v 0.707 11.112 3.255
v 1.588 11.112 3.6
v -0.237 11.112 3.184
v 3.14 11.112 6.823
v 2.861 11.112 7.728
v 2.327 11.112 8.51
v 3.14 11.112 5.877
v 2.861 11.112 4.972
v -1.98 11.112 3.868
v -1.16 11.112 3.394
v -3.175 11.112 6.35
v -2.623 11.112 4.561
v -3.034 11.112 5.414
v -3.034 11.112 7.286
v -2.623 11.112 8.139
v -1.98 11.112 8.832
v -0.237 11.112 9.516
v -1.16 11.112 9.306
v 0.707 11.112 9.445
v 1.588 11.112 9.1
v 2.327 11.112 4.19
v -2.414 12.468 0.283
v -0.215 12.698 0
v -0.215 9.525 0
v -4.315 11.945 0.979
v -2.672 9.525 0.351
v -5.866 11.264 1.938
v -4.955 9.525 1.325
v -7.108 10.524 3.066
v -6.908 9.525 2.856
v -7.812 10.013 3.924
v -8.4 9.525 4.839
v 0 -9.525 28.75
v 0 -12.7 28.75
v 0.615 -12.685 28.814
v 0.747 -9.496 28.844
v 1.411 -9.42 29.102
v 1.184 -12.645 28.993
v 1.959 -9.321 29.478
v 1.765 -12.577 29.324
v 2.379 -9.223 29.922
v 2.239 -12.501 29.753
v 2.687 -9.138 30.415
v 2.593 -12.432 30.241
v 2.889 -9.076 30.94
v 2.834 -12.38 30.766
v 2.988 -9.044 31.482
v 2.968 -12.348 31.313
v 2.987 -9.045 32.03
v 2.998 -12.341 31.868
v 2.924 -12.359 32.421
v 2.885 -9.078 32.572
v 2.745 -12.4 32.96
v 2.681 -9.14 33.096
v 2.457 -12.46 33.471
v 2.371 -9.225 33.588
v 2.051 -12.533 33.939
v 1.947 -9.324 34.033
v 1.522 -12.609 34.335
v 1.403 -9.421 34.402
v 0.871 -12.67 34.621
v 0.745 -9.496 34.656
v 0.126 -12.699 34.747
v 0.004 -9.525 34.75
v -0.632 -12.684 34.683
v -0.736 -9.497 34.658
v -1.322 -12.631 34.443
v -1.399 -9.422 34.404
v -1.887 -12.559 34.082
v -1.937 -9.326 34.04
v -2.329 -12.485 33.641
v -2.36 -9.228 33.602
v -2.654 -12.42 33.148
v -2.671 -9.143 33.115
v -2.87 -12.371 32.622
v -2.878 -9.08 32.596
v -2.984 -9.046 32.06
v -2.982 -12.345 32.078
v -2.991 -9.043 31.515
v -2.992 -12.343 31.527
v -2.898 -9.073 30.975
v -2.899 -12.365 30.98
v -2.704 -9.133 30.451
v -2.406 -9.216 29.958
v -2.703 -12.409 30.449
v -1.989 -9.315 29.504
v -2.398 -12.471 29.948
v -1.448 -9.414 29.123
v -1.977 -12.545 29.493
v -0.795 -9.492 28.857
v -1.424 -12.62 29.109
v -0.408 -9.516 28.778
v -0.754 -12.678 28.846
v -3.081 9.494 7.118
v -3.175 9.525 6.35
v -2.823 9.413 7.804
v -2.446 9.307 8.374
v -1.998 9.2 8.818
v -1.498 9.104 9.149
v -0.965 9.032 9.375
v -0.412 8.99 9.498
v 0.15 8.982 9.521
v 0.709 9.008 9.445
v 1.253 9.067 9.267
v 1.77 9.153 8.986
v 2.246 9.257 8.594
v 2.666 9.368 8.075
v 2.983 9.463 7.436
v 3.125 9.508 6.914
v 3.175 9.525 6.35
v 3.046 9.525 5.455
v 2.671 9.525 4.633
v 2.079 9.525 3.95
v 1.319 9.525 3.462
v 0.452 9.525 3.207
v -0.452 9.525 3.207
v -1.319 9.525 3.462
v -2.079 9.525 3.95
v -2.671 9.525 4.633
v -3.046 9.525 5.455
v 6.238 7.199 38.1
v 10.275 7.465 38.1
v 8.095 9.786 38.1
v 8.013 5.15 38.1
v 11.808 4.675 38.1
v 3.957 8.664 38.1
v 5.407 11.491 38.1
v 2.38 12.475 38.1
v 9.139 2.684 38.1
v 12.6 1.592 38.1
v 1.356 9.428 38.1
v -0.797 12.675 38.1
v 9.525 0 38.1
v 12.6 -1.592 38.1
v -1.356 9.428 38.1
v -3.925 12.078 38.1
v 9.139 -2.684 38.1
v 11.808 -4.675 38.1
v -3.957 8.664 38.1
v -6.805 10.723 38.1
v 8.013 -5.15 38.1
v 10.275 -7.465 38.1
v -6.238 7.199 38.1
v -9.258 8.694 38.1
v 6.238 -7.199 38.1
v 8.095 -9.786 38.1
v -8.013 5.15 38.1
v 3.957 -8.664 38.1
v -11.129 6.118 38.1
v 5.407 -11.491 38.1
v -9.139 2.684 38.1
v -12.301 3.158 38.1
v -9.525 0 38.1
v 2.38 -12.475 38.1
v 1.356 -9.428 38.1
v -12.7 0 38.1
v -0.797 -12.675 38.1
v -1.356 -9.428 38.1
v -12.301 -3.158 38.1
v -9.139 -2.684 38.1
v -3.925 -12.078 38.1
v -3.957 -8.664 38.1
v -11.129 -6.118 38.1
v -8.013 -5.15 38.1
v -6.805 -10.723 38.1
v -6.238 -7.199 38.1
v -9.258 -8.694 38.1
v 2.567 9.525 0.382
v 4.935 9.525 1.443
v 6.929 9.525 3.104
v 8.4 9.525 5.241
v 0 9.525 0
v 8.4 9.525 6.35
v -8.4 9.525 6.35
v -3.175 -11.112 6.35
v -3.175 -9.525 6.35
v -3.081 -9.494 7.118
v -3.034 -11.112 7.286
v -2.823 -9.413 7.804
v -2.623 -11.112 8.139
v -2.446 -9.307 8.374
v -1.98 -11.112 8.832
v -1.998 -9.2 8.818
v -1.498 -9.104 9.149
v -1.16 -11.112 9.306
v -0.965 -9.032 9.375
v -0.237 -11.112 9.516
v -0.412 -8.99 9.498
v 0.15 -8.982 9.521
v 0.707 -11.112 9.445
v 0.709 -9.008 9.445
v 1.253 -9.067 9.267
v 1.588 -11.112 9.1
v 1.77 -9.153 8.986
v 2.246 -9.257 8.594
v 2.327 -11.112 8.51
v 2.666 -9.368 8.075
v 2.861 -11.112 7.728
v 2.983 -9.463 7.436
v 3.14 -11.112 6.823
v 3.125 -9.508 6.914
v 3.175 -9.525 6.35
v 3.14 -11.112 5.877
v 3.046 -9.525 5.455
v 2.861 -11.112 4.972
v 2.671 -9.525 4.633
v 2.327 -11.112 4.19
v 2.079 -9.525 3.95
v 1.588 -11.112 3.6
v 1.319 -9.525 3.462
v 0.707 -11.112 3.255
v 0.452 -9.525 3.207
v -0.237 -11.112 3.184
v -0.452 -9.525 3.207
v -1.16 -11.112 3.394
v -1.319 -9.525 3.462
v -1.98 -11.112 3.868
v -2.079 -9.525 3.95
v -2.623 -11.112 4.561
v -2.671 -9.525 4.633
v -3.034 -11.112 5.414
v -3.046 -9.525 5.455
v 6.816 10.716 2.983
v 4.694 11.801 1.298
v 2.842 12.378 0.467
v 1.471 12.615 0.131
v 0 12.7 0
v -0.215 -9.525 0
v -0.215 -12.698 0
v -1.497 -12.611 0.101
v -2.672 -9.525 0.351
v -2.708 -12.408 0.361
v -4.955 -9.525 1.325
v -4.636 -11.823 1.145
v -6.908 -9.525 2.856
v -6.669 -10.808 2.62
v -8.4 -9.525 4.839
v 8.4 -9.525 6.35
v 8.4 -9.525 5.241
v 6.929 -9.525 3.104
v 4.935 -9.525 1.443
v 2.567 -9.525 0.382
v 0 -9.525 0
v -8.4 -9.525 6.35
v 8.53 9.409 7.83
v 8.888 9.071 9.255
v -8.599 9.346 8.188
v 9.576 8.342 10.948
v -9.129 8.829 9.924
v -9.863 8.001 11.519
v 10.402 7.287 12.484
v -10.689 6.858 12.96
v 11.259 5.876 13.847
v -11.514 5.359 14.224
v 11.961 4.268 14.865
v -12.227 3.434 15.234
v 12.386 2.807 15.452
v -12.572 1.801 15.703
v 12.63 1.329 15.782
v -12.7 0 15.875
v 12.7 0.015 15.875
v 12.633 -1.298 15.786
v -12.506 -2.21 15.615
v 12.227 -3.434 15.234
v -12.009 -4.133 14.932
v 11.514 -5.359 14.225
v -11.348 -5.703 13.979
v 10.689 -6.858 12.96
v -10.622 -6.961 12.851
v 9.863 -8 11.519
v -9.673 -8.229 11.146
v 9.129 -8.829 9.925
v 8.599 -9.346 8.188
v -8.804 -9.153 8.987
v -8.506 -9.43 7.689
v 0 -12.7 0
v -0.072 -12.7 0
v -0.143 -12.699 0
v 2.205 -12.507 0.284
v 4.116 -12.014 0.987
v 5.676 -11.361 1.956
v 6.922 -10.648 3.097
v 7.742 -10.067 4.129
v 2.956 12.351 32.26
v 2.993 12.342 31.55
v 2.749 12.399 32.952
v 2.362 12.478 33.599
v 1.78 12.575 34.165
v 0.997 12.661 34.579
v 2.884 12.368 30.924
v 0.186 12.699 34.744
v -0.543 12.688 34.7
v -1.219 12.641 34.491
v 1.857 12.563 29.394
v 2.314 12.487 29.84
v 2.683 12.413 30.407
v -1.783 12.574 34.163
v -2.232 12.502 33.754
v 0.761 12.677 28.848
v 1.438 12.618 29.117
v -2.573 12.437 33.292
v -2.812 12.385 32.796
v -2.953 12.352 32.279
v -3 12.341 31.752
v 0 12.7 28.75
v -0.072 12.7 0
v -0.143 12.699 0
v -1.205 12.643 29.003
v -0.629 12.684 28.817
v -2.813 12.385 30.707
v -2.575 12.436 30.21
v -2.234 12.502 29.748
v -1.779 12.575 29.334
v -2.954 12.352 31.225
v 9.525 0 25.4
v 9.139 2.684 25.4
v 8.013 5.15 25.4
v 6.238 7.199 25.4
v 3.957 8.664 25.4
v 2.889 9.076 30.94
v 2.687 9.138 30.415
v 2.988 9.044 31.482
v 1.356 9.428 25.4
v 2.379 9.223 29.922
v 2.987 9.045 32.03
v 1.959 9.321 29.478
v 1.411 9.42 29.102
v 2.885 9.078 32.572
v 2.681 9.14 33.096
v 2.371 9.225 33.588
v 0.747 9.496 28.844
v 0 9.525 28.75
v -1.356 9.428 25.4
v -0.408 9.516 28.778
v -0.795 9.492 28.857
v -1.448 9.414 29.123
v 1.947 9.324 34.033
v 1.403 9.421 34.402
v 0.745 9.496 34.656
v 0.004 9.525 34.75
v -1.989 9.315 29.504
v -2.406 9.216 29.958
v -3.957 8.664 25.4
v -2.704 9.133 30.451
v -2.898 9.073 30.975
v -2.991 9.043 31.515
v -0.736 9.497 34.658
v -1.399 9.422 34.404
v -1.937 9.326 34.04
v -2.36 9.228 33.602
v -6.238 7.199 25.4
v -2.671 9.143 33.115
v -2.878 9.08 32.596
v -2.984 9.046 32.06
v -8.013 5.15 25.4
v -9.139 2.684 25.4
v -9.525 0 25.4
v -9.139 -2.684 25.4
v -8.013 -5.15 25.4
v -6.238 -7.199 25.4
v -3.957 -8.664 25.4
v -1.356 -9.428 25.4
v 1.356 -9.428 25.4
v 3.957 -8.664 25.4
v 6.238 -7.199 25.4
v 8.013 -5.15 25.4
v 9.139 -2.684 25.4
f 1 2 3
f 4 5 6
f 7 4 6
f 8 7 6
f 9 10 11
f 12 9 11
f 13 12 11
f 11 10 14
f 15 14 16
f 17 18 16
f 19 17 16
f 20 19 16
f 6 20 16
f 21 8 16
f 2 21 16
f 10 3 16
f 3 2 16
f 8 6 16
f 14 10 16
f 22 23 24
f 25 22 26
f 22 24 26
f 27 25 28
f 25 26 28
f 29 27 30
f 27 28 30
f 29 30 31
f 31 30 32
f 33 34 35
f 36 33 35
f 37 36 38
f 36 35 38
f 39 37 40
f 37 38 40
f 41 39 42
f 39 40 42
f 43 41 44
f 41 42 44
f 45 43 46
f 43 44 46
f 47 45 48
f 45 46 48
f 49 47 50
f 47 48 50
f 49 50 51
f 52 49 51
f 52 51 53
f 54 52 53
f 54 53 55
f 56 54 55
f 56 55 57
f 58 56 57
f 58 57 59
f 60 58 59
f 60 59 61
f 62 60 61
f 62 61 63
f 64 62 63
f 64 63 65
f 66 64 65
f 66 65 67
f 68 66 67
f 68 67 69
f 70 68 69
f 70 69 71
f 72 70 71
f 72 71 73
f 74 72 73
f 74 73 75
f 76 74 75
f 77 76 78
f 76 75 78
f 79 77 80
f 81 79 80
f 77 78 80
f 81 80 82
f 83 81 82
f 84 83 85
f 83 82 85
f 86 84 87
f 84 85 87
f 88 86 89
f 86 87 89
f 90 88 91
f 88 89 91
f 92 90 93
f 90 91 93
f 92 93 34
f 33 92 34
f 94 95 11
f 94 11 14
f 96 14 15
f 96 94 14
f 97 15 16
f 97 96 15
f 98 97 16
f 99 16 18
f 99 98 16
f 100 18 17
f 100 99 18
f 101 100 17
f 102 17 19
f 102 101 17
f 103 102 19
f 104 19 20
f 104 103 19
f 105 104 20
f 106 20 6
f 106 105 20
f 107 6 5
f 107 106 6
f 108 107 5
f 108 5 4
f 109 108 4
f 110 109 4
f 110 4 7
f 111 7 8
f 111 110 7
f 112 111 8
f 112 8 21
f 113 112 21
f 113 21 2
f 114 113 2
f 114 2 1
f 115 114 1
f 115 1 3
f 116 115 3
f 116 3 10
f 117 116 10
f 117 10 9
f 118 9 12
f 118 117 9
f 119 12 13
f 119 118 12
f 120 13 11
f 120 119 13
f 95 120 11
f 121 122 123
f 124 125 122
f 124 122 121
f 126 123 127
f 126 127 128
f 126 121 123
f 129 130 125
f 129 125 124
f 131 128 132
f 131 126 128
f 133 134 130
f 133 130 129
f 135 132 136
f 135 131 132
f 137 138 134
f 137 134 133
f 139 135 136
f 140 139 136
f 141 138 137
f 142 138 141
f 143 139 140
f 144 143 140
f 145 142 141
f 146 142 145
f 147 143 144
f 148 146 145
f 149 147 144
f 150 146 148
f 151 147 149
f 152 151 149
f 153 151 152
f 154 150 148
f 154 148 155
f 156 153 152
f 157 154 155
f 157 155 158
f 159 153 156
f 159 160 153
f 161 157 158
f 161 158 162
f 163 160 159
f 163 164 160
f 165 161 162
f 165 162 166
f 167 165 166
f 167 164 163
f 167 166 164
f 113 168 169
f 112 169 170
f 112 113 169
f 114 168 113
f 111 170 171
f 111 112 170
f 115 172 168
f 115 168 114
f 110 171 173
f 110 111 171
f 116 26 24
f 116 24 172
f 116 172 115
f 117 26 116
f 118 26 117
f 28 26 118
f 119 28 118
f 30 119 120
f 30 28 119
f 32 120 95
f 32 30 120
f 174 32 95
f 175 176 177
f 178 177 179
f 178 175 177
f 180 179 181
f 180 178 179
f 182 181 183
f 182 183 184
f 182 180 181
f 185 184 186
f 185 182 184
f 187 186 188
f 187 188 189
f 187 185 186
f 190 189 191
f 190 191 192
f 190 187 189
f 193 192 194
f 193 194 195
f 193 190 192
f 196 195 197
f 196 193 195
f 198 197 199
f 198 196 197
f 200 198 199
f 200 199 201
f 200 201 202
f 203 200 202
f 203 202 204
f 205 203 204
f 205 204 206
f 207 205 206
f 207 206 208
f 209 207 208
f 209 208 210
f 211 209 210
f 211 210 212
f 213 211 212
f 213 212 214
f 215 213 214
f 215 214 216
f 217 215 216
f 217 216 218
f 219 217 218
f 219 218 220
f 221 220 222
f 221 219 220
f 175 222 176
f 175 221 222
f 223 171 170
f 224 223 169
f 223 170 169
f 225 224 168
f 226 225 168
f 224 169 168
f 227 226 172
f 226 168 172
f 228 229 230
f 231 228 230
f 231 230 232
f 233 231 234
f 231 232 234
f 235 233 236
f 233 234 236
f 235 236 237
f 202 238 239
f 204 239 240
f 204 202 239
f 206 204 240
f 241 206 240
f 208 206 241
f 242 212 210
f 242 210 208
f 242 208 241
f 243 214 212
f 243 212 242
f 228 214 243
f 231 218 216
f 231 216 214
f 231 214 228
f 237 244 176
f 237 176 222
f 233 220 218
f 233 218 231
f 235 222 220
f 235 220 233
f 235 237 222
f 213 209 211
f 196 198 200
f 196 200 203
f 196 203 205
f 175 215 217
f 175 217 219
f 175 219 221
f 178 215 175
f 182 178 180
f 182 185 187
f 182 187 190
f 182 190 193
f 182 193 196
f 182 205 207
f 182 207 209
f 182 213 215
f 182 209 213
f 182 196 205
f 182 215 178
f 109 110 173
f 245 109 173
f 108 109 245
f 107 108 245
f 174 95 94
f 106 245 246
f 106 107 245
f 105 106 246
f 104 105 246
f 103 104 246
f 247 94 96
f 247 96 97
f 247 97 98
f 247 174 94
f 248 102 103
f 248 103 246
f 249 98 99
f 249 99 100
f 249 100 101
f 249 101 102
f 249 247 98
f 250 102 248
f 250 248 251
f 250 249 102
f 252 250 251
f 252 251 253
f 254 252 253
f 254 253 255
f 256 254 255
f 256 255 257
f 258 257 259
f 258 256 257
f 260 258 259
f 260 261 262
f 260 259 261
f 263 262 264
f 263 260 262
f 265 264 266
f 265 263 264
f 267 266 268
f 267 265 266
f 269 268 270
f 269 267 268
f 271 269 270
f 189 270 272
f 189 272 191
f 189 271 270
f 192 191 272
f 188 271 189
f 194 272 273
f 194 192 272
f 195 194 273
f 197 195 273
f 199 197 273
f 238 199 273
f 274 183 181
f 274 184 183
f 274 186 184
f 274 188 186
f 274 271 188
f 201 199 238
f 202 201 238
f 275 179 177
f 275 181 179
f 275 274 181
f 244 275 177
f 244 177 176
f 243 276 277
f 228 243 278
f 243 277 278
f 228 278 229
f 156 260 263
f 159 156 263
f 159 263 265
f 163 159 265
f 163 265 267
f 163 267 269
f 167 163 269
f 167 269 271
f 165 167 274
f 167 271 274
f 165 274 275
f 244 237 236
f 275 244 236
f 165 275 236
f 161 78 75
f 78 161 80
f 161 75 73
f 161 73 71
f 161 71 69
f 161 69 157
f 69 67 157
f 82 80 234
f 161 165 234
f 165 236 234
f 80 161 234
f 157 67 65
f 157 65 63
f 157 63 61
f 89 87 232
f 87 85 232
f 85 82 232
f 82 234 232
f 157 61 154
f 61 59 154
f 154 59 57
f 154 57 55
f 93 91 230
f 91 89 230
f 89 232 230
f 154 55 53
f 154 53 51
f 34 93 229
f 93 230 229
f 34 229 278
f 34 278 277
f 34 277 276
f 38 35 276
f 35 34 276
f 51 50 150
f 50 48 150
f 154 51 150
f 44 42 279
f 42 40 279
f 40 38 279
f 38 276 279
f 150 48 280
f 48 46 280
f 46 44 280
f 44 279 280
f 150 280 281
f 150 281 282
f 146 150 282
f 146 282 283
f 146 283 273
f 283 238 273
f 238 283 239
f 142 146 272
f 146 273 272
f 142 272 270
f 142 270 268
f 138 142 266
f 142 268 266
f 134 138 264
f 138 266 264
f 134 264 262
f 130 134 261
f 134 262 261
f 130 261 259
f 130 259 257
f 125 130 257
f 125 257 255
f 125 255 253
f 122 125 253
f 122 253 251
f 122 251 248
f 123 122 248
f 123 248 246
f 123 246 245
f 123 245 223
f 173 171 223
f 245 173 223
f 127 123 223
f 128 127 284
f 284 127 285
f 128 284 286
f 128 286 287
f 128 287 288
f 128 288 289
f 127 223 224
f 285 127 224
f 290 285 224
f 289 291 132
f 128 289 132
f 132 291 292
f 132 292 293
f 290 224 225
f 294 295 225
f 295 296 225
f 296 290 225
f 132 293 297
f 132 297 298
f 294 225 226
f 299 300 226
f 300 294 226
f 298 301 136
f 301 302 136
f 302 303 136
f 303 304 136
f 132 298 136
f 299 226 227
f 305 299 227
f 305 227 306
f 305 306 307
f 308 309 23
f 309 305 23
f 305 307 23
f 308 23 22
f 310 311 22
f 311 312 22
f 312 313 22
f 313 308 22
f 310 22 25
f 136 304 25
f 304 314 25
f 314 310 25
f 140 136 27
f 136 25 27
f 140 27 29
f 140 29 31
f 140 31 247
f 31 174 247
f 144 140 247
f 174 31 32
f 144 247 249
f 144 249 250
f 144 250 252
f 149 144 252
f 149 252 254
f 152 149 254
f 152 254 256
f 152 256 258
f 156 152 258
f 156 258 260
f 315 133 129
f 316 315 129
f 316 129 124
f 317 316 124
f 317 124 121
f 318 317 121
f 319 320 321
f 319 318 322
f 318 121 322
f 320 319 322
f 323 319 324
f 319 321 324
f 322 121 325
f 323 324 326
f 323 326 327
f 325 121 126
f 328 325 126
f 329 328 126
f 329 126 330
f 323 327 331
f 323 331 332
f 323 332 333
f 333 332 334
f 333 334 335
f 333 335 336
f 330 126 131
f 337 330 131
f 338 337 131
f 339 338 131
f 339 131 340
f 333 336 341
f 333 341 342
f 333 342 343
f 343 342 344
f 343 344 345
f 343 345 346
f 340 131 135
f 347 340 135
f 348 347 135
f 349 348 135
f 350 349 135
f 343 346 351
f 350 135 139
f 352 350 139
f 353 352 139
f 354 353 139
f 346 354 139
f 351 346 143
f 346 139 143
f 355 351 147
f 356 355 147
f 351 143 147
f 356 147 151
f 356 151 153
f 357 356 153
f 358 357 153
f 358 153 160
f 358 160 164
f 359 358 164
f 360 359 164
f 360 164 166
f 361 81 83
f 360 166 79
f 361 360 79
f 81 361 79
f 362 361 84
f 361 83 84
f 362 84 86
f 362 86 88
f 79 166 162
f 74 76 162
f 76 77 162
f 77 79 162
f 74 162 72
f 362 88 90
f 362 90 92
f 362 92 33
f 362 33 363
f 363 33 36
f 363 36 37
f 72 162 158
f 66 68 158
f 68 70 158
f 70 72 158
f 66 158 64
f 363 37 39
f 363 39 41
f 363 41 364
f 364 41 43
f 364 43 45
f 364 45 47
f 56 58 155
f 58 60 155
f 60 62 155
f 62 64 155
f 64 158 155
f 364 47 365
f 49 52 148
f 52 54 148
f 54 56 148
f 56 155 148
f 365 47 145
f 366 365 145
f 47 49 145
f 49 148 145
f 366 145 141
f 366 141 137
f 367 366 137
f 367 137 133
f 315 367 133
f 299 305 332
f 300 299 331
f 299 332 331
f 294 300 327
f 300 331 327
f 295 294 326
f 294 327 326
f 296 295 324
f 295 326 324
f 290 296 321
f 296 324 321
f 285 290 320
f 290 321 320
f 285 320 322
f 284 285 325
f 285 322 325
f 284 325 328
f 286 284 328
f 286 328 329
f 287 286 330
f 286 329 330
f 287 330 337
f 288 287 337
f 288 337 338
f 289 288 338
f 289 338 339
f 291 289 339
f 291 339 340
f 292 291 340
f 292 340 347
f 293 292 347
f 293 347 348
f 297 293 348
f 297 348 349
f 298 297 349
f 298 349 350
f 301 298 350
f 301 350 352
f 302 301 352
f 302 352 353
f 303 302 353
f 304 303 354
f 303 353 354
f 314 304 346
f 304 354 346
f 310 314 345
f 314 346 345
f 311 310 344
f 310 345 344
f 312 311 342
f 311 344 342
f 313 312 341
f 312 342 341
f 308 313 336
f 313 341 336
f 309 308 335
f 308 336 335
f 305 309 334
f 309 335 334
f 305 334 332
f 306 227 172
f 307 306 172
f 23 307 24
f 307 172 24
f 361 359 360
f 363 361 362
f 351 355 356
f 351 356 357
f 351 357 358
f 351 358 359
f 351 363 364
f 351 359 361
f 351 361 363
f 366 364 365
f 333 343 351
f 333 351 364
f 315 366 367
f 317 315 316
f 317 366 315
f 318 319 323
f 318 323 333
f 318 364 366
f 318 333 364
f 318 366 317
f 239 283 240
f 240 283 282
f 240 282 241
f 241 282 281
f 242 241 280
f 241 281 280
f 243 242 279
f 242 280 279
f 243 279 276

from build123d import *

# Parameters (mm, degrees)
SKETCH1_R               = 12.7
BOSS_EXTRUDE1_DEPTH     = 38.1
CUT_EXTRUDE2_DEPTH      = 48.519048812
CUT_EXTRUDE3_DEPTH      = 38.1
SKETCH4_R               = 9.525
CUT_EXTRUDE4_DEPTH      = 12.7
CUT_EXTRUDE5_DEPTH      = 11.1125
CUT_EXTRUDE5_DEPTH_BACK = 11.1125
SKETCH6_R               = 3.175
SKETCH7_R               = 3
CUT_EXTRUDE6_DEPTH      = 48.519048972


with BuildPart() as part:
    # Sketch1 → Boss-Extrude1 (new body)
    with BuildSketch(Plane.XY):
        Circle(SKETCH1_R)
    extrude(amount=BOSS_EXTRUDE1_DEPTH)

    # Sketch2 → Cut-Extrude2 (cut, through all)
    with BuildSketch(Plane(origin=(12.7, 0, 0), x_dir=(0, 0, -1), z_dir=(1, 0, 0))):
        with BuildLine():
            Line((3.175, 9.525), (-6.35, 9.525))
            ThreePointArc((-6.35, 9.525), (-15.875, 0), (-6.35, -9.525))
            Line((-6.35, -9.525), (3.175, -9.525))
            Line((3.175, -9.525), (3.175, 9.525))
        make_face()
    extrude(amount=-CUT_EXTRUDE2_DEPTH, mode=Mode.SUBTRACT)

    # Sketch3 → Cut-Extrude3 (cut)
    with BuildSketch(Plane(origin=(0, -12.7, 0), x_dir=(-1, 0, 0), z_dir=(0, -1, 0))):
        with BuildLine():
            ThreePointArc((-8.400260413, -5.241151589), (-4.934653756, -1.443317517), (0, 0))
            Line((0, 0), (-8.400260413, 0))
            Line((-8.400260413, 0), (-8.400260413, -5.241151589))
        make_face()
        with BuildLine():
            Line((8.400260413, 0), (0.21470184, 0))
            ThreePointArc((0.21470184, 0), (4.954513337, -1.324965695), (8.400260413, -4.838962595))
            Line((8.400260413, -4.838962595), (8.400260413, 0))
        make_face()
    extrude(amount=-CUT_EXTRUDE3_DEPTH, mode=Mode.SUBTRACT)

    # Sketch4 → Cut-Extrude4 (cut)
    with BuildSketch(Plane.XY.offset(38.1)):
        Circle(SKETCH4_R)
    extrude(amount=-CUT_EXTRUDE4_DEPTH, mode=Mode.SUBTRACT)

    # Sketch6 → Cut-Extrude5 (cut, two sides: drawn at the far end of the back side and taken through both)
    with BuildSketch(Plane(origin=(0, 0, 0), x_dir=(1, 0, 0), z_dir=(0, 1, 0)).offset(-CUT_EXTRUDE5_DEPTH_BACK)):
        with Locations((0, -6.35)):
            Circle(SKETCH6_R)
    extrude(amount=CUT_EXTRUDE5_DEPTH + CUT_EXTRUDE5_DEPTH_BACK, mode=Mode.SUBTRACT)

    # Sketch7 → Cut-Extrude6 (cut, through all)
    with BuildSketch(Plane(origin=(0, -12.7, 0), x_dir=(-1, 0, 0), z_dir=(0, -1, 0))):
        with Locations((0, -31.75)):
            Circle(SKETCH7_R)
    extrude(amount=-CUT_EXTRUDE6_DEPTH, mode=Mode.SUBTRACT)


solid = part.part
